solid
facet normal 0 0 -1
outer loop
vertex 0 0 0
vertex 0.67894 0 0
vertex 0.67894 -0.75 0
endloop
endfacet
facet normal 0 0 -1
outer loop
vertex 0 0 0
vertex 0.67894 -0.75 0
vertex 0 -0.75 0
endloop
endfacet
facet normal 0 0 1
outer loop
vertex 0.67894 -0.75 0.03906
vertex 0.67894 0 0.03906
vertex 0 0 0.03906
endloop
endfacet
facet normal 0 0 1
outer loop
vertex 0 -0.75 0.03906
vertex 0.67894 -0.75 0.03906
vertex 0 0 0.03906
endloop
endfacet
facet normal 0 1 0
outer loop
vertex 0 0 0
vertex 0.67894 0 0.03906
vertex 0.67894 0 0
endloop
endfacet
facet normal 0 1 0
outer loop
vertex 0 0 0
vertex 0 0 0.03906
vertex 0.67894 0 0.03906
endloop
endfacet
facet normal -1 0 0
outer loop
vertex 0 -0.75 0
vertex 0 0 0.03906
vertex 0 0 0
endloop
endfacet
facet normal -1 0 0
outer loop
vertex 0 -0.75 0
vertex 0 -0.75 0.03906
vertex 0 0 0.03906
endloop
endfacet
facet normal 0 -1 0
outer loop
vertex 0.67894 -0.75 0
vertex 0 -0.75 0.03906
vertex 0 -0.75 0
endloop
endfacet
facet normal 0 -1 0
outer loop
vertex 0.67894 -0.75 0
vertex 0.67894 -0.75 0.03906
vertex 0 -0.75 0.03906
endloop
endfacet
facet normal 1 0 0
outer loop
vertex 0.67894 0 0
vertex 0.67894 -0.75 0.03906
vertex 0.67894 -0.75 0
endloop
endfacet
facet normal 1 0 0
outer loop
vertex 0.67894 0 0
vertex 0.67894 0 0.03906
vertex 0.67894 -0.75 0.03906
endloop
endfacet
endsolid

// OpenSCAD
EPS = 0.01;

translate([0, -0.75, 0])
linear_extrude(height=0.0390625)
    polygon(points=[[0.6789473684210526, 0.0], [0.6789473684210526, 0.75], [0.0, 0.75], [0.0, 0.0]]);
